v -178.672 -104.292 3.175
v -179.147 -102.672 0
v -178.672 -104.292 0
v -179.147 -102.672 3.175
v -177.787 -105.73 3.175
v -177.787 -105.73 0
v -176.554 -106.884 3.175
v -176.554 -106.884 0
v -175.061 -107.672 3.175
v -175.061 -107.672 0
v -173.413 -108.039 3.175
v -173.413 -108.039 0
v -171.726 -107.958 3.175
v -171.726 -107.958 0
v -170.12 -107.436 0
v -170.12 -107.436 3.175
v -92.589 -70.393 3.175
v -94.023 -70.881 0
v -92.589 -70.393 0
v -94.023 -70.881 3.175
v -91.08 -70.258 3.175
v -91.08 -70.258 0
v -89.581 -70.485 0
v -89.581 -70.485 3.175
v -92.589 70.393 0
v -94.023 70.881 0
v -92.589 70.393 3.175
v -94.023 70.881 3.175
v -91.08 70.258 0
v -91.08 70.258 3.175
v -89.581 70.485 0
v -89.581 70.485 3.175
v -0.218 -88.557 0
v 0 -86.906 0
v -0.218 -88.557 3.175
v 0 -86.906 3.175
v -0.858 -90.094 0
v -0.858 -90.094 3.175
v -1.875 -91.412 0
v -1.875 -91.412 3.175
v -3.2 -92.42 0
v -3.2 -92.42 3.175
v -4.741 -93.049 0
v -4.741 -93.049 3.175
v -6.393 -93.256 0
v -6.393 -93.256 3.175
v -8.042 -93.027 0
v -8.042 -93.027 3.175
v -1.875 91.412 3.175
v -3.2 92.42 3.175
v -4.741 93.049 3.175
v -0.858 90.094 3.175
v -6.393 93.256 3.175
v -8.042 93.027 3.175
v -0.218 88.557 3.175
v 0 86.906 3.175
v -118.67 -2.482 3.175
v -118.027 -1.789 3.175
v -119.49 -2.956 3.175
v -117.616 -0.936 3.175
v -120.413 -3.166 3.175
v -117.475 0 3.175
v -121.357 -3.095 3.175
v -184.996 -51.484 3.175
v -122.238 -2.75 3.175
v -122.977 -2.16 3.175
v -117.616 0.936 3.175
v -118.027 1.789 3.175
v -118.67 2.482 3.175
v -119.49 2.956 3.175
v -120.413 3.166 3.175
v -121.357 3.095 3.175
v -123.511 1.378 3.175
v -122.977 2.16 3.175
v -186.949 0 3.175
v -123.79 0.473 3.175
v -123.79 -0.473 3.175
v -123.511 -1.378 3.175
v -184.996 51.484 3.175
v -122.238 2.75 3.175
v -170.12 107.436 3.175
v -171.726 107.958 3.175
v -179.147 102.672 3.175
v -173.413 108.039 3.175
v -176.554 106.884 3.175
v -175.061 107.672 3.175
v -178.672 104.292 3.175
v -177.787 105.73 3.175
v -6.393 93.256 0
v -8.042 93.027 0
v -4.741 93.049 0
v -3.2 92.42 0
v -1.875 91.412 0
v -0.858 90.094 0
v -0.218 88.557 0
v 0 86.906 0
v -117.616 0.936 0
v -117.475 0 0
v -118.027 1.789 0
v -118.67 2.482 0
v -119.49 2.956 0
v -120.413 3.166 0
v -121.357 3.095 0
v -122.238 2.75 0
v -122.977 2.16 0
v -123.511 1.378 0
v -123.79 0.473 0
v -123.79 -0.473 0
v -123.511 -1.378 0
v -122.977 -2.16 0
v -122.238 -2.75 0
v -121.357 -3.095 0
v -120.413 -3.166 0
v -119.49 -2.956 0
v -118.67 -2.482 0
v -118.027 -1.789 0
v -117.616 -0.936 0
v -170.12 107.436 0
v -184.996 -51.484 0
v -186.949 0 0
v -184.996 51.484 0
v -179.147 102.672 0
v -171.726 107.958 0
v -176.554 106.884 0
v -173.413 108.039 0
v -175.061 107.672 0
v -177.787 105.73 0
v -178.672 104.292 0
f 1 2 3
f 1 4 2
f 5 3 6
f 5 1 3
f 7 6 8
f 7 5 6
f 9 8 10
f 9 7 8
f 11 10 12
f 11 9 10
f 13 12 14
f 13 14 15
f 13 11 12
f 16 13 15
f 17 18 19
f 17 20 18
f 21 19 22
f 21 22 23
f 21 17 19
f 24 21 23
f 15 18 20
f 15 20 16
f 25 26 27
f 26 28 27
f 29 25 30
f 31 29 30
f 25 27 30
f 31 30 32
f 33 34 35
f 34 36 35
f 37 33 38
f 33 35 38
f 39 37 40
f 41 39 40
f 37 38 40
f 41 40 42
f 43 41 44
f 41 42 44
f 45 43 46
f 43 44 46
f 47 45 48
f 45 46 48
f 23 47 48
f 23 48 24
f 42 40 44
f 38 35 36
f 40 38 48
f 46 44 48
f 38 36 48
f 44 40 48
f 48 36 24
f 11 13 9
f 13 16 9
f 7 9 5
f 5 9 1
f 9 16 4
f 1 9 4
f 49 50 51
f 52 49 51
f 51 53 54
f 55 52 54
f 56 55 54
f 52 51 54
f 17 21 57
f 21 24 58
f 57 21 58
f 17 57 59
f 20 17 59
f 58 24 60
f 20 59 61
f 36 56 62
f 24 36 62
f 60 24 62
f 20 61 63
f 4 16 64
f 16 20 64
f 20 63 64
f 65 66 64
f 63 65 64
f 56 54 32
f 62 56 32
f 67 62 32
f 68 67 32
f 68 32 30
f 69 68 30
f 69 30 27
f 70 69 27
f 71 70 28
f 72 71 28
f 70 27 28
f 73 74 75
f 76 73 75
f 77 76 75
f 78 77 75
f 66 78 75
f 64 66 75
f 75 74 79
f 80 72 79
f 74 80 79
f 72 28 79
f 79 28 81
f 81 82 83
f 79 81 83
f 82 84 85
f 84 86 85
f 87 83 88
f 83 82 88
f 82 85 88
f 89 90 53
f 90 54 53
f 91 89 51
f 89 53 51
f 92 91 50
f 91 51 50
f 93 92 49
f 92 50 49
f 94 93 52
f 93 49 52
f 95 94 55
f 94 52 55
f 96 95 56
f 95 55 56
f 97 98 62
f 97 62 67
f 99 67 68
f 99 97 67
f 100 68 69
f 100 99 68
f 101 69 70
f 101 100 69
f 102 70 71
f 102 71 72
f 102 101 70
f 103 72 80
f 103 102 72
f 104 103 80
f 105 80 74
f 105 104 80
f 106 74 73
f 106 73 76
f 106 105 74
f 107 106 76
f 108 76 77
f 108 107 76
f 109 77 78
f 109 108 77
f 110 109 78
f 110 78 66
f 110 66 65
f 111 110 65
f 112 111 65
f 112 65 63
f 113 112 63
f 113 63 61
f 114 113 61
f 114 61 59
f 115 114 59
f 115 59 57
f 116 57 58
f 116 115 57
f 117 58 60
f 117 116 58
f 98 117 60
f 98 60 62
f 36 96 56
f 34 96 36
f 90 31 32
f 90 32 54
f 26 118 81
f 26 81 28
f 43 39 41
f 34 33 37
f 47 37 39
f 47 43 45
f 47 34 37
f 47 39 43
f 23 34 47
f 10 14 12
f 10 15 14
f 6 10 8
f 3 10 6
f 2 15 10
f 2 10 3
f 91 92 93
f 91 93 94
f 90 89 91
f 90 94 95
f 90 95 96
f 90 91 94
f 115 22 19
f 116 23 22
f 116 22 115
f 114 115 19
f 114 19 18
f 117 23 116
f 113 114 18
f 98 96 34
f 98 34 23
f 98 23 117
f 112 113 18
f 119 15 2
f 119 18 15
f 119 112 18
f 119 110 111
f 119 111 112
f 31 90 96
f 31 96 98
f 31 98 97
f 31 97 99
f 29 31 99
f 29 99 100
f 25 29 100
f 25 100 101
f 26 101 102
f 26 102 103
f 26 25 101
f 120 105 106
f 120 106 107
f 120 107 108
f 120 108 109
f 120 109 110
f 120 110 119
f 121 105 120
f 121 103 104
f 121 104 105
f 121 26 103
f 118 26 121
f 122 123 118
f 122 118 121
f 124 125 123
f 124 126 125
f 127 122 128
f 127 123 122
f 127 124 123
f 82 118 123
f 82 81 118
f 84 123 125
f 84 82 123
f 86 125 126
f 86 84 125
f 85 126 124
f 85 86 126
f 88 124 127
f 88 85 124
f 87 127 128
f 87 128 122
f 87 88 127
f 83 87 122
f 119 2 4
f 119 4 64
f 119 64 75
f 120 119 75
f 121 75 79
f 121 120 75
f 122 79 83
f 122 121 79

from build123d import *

# Parameters (mm, degrees)
SKETCH1_R           = 3.175
BOSS_EXTRUDE1_DEPTH = 3.175
FILLET1_R           = 6.35


with BuildPart() as part:
    # Sketch1 → Boss-Extrude1 (new body)
    with BuildSketch(Plane.XY):
        with BuildLine():
            Line((-177.8, 111.125), (-91.8765625, 69.85))
            Line((-91.8765625, 69.85), (0, 95.25))
            Line((0, 95.25), (0, -95.25))
            Line((0, -95.25), (-91.8765625, -69.85))
            Line((-91.8765625, -69.85), (-177.8, -111.125))
            ThreePointArc((-177.8, -111.125), (-186.948920727, 0), (-177.8, 111.125))
        make_face()
        with Locations((-120.65, 0)):
            Circle(SKETCH1_R, mode=Mode.SUBTRACT)
    extrude(amount=BOSS_EXTRUDE1_DEPTH)

    # Fillet1
    fillet1_edges = [part.edges().sort_by_distance(p)[0] for p in [
        (-177.8, 111.125, 1.5875),
        (-91.8765625, 69.85, 1.5875),
        (0, 95.25, 1.5875),
        (0, -95.25, 1.5875),
        (-91.8765625, -69.85, 1.5875),
        (-177.8, -111.125, 1.5875),
    ]]
    fillet(fillet1_edges, radius=FILLET1_R)


solid = part.part
